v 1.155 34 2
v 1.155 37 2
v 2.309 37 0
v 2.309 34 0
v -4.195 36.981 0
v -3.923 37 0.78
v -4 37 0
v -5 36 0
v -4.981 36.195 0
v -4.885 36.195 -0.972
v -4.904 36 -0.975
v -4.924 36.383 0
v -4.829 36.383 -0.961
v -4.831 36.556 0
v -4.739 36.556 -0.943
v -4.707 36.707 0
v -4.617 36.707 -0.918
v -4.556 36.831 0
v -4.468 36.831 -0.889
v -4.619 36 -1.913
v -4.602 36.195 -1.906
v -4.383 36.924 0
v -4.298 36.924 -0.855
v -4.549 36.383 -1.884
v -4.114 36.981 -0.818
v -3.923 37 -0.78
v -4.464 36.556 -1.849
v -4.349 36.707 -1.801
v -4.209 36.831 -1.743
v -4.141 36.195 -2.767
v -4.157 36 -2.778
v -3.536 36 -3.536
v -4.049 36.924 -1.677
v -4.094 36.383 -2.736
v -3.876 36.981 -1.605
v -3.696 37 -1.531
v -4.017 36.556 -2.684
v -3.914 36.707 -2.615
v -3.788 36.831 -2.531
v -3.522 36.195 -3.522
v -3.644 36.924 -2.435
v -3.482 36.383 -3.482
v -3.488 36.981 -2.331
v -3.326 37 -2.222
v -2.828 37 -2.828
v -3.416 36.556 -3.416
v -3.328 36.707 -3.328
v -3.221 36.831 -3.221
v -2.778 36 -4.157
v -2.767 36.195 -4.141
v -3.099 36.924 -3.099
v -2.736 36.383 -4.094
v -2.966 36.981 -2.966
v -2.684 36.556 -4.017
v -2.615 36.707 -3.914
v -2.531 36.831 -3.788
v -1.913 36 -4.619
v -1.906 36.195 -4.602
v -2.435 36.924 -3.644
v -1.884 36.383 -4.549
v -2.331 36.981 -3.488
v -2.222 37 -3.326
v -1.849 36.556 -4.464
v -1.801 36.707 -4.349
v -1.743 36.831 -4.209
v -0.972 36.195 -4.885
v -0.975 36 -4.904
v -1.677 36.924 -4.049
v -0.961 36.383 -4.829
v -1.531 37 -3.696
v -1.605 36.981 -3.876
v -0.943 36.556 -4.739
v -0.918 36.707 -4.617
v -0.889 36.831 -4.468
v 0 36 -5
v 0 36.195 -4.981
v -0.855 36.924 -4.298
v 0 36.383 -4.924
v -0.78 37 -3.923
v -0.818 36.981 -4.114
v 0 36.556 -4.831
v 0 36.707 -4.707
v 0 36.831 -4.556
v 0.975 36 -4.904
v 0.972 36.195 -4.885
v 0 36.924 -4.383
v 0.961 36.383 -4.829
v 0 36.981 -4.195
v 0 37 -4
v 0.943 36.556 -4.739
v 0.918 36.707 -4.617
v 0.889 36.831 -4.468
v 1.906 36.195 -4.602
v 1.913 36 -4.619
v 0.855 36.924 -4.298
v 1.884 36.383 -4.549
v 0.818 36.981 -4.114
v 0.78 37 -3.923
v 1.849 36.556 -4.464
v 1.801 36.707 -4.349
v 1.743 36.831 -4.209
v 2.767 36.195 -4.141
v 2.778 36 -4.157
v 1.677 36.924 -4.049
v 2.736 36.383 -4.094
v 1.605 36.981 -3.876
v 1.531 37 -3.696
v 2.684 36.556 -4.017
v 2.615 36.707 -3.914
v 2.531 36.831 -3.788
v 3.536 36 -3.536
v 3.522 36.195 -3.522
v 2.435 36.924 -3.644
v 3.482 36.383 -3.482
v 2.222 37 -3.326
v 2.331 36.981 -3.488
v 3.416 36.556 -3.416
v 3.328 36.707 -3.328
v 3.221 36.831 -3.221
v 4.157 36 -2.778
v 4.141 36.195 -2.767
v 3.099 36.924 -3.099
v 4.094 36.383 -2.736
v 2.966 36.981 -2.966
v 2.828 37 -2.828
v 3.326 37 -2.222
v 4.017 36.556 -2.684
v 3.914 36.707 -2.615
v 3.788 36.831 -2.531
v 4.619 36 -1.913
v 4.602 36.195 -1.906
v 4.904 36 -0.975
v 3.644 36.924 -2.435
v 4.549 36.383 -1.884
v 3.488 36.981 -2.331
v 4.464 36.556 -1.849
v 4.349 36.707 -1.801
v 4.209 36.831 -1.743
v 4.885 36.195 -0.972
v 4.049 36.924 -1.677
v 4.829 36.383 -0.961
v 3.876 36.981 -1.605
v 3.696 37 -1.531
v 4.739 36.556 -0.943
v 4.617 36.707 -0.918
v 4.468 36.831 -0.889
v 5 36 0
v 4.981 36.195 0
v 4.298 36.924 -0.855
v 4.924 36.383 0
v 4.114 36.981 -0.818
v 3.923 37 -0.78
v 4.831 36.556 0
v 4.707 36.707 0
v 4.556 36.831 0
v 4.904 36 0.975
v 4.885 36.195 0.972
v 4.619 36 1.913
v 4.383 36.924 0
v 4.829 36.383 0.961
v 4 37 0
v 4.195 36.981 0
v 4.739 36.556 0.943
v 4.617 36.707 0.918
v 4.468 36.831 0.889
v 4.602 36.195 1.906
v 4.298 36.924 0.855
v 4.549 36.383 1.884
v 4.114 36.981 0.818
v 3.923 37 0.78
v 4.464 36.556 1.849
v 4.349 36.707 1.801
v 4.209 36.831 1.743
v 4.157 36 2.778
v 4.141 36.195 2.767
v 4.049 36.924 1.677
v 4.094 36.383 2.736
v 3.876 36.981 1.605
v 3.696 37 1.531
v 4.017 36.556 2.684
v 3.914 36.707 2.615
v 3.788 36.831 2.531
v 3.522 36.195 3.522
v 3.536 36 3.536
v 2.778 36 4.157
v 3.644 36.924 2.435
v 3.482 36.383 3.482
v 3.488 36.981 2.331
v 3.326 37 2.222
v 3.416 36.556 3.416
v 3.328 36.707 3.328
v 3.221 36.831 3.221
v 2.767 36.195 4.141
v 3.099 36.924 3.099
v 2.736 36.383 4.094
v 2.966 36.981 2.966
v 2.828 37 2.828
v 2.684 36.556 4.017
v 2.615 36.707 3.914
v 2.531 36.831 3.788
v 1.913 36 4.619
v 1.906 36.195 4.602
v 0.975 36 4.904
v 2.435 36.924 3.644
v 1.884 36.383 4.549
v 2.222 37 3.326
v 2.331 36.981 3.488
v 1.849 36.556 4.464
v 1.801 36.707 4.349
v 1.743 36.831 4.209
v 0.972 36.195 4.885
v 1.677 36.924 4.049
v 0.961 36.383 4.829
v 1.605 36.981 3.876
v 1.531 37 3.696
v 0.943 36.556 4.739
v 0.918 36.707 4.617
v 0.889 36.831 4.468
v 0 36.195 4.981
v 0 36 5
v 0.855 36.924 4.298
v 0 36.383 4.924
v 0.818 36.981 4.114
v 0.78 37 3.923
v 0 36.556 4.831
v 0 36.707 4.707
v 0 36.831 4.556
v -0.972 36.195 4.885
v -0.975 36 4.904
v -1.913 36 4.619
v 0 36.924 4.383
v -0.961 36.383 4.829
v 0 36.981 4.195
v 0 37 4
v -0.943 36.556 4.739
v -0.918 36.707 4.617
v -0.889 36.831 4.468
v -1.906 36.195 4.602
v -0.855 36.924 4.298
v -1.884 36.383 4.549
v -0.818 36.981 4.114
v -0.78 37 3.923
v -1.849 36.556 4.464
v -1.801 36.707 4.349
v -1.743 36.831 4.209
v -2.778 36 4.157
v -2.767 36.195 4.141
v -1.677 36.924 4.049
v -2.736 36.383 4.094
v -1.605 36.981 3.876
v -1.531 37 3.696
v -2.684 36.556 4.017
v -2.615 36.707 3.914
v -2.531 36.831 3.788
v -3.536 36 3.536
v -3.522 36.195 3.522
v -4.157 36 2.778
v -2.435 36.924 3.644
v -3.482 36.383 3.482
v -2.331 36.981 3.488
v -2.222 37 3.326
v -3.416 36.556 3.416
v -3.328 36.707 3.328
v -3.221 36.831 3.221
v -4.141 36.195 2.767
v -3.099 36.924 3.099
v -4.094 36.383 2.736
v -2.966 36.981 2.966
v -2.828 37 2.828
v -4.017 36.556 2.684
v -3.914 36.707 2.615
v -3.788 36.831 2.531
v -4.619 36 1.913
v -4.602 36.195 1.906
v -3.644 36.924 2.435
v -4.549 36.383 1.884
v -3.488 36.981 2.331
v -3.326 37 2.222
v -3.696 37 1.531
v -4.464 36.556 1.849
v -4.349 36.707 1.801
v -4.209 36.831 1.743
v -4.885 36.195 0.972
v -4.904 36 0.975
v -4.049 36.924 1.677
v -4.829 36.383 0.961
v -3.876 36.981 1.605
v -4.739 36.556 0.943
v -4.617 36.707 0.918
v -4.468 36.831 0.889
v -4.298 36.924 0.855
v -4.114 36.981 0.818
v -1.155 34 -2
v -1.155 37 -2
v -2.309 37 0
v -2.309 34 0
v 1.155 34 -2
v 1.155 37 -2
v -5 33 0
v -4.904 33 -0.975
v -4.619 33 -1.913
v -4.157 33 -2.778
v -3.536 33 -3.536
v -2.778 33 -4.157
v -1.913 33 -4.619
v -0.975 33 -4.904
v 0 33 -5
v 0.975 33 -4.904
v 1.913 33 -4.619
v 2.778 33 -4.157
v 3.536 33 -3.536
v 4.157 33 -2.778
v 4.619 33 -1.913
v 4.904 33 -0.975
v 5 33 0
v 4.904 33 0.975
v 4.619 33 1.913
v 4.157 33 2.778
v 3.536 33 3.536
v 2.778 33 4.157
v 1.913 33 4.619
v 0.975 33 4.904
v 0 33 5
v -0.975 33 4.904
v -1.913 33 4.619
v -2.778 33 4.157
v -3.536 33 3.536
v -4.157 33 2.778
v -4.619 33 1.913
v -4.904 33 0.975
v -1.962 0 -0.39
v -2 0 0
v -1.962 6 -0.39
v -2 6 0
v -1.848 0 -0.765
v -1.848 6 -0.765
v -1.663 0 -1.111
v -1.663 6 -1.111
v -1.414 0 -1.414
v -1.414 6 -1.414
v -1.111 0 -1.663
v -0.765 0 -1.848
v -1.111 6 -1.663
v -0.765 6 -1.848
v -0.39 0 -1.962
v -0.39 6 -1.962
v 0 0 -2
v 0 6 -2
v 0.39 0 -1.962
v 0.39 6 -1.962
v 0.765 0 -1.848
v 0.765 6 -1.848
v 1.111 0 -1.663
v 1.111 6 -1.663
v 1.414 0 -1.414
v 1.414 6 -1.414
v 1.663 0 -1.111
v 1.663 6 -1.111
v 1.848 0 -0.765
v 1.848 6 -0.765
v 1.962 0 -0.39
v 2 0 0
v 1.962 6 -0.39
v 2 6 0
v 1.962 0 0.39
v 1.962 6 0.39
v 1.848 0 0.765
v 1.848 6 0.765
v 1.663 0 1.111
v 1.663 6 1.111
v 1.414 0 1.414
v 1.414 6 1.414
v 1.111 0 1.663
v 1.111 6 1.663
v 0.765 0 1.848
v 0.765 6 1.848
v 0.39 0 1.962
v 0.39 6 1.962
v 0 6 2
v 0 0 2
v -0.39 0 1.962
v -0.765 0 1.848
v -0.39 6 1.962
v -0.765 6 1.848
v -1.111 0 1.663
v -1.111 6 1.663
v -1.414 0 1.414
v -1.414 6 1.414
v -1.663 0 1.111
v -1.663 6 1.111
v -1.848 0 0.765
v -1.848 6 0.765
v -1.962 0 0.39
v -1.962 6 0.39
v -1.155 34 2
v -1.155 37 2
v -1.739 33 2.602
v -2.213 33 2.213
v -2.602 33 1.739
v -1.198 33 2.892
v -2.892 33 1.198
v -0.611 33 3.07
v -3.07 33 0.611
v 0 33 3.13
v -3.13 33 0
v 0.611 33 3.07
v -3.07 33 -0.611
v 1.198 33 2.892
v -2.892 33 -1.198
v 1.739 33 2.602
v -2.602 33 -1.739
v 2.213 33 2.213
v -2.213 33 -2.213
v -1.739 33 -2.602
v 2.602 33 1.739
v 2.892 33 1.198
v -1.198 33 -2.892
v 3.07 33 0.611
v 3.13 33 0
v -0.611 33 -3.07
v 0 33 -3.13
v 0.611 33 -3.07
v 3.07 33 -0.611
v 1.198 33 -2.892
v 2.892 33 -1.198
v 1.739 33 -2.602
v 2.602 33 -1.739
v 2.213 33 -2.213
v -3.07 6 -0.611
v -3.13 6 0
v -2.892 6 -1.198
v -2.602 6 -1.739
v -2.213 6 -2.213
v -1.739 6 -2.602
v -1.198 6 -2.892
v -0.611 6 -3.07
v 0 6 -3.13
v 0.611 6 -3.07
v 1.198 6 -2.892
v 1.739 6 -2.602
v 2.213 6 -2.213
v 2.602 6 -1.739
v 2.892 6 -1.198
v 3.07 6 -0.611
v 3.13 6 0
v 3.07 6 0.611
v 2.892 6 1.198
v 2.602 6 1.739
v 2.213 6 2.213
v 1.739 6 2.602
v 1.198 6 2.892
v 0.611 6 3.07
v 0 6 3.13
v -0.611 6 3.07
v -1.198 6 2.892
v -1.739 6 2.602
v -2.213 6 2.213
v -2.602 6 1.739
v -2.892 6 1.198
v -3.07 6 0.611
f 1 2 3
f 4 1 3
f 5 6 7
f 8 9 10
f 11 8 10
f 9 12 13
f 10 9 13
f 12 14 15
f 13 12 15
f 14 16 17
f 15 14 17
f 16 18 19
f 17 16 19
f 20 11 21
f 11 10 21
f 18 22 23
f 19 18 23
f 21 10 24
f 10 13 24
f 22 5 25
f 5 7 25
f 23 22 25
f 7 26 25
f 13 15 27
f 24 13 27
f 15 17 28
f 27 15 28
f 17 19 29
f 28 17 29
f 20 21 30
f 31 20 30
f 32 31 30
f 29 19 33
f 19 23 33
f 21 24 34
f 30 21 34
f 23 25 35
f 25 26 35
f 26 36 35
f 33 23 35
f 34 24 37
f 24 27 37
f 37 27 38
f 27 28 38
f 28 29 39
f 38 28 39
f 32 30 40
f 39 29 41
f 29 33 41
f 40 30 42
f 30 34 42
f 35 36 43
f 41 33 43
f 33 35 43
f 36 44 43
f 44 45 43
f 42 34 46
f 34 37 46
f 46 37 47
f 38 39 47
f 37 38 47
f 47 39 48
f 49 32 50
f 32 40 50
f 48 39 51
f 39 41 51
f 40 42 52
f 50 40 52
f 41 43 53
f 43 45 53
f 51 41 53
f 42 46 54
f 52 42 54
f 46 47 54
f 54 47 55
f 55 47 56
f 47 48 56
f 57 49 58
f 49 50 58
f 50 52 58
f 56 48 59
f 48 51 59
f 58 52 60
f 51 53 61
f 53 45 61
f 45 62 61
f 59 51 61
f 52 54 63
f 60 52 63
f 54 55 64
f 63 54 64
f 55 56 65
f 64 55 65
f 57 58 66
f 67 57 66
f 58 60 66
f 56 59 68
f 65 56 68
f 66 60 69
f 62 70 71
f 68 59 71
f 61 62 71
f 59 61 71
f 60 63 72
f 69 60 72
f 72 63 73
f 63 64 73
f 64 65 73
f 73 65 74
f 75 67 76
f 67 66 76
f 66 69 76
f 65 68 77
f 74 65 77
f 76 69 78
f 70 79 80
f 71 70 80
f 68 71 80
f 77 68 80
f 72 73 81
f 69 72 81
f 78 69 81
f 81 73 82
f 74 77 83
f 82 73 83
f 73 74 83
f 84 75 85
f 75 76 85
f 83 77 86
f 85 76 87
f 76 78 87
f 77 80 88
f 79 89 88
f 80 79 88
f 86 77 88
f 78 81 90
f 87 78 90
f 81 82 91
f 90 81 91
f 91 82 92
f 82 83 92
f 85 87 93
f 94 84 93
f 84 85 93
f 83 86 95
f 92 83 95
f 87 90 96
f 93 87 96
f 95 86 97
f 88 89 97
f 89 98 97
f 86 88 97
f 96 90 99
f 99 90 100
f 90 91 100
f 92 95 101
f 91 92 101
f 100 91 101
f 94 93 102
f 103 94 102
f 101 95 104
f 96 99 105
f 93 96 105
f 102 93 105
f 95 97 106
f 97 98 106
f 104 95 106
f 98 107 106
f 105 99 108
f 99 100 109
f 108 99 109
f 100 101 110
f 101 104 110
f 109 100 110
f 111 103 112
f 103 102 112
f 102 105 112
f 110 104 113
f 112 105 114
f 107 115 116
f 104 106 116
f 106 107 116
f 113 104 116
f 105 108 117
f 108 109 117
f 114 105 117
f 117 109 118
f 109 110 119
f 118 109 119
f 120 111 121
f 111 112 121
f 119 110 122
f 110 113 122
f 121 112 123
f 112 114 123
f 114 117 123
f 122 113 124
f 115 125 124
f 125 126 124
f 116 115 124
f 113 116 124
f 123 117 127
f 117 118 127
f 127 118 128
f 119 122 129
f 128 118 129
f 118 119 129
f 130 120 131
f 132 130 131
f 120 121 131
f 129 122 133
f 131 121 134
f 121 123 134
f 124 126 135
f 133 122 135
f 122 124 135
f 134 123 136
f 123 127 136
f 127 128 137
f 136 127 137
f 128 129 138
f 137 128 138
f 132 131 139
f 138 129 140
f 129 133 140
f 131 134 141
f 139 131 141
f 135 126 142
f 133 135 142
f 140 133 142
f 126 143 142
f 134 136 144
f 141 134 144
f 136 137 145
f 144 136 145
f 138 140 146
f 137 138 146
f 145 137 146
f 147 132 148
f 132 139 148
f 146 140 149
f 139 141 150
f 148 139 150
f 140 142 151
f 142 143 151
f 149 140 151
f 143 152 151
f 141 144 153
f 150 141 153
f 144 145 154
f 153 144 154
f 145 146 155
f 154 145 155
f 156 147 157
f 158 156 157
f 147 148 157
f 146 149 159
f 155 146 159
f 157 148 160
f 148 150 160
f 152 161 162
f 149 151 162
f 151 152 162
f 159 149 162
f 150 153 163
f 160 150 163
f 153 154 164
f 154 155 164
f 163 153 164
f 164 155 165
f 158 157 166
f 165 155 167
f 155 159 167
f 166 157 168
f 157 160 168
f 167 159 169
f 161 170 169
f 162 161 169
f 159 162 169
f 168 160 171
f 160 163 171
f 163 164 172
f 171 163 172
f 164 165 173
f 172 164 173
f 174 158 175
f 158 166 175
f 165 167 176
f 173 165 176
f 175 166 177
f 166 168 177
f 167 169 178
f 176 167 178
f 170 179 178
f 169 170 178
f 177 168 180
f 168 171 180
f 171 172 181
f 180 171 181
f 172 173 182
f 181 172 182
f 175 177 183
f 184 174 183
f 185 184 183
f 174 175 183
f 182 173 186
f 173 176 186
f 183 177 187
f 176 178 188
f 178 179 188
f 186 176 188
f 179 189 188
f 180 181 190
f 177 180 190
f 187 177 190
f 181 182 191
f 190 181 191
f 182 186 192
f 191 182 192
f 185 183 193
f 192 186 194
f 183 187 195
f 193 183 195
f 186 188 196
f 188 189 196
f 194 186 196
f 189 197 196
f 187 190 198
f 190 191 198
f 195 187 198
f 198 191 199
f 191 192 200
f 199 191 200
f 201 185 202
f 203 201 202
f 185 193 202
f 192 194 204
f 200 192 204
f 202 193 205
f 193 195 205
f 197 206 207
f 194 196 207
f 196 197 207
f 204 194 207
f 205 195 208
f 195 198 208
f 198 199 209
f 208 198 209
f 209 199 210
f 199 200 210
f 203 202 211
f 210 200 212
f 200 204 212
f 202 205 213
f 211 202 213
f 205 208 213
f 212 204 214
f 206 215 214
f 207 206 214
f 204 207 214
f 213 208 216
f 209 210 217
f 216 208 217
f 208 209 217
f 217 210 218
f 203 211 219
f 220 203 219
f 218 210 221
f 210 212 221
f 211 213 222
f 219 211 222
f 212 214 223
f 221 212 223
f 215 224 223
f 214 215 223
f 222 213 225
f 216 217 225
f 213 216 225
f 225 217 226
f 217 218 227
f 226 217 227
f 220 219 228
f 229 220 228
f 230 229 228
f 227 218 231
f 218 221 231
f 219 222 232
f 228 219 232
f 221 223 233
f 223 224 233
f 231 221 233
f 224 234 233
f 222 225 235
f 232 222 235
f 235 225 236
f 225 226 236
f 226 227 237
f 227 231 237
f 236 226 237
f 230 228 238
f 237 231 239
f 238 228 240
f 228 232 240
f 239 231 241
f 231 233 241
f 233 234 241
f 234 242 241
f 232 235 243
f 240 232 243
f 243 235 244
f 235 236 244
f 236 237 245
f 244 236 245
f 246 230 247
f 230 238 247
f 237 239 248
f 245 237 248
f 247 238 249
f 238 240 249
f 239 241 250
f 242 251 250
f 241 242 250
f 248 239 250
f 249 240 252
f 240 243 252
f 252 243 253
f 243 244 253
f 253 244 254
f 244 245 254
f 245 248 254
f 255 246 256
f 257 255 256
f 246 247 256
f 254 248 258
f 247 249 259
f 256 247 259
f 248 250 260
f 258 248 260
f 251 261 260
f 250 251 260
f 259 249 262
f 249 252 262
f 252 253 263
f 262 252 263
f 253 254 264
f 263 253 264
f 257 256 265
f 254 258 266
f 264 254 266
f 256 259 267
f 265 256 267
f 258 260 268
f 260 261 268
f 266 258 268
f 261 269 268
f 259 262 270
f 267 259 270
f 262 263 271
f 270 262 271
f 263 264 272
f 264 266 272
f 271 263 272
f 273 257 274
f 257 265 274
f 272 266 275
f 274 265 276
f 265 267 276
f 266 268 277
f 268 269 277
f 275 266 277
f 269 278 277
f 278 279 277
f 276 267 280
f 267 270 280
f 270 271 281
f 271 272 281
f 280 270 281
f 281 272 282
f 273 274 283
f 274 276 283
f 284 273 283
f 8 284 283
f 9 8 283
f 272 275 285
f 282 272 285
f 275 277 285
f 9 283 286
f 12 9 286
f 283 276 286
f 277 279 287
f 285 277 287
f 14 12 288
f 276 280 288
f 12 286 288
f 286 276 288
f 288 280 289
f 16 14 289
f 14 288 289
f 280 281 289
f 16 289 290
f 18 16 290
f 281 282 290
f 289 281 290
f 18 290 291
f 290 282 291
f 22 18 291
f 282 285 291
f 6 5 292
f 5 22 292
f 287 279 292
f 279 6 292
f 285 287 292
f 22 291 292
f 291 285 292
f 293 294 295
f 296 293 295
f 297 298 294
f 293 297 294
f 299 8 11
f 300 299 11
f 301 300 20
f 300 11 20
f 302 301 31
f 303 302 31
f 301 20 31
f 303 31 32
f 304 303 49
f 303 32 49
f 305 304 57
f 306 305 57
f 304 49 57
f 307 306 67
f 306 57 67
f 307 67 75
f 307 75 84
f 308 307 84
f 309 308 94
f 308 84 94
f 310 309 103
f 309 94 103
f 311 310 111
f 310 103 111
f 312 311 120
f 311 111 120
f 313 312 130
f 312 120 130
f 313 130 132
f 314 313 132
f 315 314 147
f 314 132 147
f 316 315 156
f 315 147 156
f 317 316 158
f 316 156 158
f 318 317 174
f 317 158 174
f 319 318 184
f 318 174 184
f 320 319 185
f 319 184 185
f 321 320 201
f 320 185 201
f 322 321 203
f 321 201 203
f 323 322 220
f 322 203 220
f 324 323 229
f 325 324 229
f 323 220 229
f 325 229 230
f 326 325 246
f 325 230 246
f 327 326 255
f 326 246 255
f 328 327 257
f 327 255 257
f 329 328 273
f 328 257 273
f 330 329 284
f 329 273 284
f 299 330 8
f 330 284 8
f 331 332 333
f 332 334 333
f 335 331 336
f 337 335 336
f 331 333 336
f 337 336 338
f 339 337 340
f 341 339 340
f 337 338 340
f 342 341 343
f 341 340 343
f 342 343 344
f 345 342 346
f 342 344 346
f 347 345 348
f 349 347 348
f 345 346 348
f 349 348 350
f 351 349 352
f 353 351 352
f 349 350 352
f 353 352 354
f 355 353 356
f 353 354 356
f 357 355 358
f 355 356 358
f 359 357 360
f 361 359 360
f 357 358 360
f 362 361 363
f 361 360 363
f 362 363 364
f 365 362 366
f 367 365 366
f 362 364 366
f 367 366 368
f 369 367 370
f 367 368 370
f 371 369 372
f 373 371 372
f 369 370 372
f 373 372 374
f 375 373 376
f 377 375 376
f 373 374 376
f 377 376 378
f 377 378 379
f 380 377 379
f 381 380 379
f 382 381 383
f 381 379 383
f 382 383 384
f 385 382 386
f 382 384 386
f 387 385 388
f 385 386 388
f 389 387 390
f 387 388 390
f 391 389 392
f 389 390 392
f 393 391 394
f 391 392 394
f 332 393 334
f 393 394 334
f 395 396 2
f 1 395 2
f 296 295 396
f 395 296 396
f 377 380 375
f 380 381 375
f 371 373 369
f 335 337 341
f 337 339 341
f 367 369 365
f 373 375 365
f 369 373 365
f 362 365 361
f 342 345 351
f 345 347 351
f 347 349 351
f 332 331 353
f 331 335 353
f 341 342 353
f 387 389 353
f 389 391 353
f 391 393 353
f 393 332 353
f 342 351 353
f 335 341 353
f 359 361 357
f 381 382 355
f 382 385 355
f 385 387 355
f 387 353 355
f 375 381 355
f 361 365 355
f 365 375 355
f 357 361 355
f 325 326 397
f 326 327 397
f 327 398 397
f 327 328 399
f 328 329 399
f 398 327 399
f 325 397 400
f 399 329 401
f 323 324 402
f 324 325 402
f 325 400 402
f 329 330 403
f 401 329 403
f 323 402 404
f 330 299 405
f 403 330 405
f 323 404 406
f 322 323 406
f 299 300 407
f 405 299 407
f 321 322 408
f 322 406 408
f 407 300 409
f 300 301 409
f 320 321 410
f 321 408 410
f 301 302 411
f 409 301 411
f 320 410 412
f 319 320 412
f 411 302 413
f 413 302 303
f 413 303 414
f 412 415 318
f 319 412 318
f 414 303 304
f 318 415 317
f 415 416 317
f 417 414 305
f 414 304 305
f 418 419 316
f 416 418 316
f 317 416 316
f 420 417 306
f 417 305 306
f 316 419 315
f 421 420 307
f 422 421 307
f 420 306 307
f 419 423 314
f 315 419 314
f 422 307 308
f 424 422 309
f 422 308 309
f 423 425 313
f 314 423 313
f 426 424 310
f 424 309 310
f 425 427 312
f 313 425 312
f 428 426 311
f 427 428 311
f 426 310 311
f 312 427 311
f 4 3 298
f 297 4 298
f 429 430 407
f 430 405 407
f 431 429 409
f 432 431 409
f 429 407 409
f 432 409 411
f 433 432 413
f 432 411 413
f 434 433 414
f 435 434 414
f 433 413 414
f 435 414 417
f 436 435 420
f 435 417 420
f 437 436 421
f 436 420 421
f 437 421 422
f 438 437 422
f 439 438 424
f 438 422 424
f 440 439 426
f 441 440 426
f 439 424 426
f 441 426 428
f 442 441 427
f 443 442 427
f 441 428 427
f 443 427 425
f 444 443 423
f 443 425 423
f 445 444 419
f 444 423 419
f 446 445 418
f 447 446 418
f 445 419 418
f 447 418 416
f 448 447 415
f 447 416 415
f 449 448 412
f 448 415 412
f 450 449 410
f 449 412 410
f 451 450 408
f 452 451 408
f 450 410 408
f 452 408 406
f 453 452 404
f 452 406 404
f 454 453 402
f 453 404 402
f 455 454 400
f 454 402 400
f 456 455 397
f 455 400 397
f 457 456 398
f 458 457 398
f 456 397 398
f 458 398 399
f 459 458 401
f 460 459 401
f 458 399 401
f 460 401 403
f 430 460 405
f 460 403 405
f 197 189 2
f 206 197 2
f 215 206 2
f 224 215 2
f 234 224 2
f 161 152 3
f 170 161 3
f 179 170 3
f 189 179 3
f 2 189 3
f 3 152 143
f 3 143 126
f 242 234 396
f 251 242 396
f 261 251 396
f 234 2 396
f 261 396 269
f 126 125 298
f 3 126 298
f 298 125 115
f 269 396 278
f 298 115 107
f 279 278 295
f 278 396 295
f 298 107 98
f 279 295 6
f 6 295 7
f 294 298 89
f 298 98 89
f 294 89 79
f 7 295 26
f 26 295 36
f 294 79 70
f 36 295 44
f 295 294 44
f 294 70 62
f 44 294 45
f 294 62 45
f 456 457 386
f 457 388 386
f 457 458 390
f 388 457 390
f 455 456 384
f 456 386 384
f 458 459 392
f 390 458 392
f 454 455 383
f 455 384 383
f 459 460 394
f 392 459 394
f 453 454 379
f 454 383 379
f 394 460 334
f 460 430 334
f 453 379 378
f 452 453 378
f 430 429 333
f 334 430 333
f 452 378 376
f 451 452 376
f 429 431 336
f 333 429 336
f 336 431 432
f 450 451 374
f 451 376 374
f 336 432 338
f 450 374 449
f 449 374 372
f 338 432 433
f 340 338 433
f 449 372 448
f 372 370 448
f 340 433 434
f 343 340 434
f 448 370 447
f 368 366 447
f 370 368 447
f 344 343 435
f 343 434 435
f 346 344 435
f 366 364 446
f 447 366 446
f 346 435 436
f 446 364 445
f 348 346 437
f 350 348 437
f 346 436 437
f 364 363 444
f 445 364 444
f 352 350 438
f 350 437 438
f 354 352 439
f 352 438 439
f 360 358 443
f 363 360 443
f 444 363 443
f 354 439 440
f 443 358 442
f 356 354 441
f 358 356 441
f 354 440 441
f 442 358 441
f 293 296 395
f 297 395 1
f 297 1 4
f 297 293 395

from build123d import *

# Parameters (mm, degrees)
CUT_EXTRUDE1_DEPTH = 3
FILLET1_R          = 1


with BuildPart() as part:
    # Sketch1 → Revolve1 (revolve)
    with BuildSketch(Plane.XY):
        Polygon((0, 0), (-2, 0), (-2, 6), (-3.13, 6), (-3.13, 33), (-5, 33), (-5, 37), (0, 37), align=None)
    revolve(axis=Axis((0, 37, 0), (0, -1, 0)))

    # Sketch2 → Cut-Extrude1 (cut)
    with BuildSketch(Plane(origin=(0, 37, 0), x_dir=(1, 0, 0), z_dir=(0, 1, 0))):
        Polygon((-1.154700538, -2), (1.154700538, -2), (2.309401077, 0), (1.154700538, 2), (-1.154700538, 2), (-2.309401077, 0), align=None)
    extrude(amount=-CUT_EXTRUDE1_DEPTH, mode=Mode.SUBTRACT)

    # Fillet1
    fillet1_edges = [part.edges().sort_by_distance(p)[0] for p in [
        (5, 37, 0),
    ]]
    fillet(fillet1_edges, radius=FILLET1_R)


solid = part.part
